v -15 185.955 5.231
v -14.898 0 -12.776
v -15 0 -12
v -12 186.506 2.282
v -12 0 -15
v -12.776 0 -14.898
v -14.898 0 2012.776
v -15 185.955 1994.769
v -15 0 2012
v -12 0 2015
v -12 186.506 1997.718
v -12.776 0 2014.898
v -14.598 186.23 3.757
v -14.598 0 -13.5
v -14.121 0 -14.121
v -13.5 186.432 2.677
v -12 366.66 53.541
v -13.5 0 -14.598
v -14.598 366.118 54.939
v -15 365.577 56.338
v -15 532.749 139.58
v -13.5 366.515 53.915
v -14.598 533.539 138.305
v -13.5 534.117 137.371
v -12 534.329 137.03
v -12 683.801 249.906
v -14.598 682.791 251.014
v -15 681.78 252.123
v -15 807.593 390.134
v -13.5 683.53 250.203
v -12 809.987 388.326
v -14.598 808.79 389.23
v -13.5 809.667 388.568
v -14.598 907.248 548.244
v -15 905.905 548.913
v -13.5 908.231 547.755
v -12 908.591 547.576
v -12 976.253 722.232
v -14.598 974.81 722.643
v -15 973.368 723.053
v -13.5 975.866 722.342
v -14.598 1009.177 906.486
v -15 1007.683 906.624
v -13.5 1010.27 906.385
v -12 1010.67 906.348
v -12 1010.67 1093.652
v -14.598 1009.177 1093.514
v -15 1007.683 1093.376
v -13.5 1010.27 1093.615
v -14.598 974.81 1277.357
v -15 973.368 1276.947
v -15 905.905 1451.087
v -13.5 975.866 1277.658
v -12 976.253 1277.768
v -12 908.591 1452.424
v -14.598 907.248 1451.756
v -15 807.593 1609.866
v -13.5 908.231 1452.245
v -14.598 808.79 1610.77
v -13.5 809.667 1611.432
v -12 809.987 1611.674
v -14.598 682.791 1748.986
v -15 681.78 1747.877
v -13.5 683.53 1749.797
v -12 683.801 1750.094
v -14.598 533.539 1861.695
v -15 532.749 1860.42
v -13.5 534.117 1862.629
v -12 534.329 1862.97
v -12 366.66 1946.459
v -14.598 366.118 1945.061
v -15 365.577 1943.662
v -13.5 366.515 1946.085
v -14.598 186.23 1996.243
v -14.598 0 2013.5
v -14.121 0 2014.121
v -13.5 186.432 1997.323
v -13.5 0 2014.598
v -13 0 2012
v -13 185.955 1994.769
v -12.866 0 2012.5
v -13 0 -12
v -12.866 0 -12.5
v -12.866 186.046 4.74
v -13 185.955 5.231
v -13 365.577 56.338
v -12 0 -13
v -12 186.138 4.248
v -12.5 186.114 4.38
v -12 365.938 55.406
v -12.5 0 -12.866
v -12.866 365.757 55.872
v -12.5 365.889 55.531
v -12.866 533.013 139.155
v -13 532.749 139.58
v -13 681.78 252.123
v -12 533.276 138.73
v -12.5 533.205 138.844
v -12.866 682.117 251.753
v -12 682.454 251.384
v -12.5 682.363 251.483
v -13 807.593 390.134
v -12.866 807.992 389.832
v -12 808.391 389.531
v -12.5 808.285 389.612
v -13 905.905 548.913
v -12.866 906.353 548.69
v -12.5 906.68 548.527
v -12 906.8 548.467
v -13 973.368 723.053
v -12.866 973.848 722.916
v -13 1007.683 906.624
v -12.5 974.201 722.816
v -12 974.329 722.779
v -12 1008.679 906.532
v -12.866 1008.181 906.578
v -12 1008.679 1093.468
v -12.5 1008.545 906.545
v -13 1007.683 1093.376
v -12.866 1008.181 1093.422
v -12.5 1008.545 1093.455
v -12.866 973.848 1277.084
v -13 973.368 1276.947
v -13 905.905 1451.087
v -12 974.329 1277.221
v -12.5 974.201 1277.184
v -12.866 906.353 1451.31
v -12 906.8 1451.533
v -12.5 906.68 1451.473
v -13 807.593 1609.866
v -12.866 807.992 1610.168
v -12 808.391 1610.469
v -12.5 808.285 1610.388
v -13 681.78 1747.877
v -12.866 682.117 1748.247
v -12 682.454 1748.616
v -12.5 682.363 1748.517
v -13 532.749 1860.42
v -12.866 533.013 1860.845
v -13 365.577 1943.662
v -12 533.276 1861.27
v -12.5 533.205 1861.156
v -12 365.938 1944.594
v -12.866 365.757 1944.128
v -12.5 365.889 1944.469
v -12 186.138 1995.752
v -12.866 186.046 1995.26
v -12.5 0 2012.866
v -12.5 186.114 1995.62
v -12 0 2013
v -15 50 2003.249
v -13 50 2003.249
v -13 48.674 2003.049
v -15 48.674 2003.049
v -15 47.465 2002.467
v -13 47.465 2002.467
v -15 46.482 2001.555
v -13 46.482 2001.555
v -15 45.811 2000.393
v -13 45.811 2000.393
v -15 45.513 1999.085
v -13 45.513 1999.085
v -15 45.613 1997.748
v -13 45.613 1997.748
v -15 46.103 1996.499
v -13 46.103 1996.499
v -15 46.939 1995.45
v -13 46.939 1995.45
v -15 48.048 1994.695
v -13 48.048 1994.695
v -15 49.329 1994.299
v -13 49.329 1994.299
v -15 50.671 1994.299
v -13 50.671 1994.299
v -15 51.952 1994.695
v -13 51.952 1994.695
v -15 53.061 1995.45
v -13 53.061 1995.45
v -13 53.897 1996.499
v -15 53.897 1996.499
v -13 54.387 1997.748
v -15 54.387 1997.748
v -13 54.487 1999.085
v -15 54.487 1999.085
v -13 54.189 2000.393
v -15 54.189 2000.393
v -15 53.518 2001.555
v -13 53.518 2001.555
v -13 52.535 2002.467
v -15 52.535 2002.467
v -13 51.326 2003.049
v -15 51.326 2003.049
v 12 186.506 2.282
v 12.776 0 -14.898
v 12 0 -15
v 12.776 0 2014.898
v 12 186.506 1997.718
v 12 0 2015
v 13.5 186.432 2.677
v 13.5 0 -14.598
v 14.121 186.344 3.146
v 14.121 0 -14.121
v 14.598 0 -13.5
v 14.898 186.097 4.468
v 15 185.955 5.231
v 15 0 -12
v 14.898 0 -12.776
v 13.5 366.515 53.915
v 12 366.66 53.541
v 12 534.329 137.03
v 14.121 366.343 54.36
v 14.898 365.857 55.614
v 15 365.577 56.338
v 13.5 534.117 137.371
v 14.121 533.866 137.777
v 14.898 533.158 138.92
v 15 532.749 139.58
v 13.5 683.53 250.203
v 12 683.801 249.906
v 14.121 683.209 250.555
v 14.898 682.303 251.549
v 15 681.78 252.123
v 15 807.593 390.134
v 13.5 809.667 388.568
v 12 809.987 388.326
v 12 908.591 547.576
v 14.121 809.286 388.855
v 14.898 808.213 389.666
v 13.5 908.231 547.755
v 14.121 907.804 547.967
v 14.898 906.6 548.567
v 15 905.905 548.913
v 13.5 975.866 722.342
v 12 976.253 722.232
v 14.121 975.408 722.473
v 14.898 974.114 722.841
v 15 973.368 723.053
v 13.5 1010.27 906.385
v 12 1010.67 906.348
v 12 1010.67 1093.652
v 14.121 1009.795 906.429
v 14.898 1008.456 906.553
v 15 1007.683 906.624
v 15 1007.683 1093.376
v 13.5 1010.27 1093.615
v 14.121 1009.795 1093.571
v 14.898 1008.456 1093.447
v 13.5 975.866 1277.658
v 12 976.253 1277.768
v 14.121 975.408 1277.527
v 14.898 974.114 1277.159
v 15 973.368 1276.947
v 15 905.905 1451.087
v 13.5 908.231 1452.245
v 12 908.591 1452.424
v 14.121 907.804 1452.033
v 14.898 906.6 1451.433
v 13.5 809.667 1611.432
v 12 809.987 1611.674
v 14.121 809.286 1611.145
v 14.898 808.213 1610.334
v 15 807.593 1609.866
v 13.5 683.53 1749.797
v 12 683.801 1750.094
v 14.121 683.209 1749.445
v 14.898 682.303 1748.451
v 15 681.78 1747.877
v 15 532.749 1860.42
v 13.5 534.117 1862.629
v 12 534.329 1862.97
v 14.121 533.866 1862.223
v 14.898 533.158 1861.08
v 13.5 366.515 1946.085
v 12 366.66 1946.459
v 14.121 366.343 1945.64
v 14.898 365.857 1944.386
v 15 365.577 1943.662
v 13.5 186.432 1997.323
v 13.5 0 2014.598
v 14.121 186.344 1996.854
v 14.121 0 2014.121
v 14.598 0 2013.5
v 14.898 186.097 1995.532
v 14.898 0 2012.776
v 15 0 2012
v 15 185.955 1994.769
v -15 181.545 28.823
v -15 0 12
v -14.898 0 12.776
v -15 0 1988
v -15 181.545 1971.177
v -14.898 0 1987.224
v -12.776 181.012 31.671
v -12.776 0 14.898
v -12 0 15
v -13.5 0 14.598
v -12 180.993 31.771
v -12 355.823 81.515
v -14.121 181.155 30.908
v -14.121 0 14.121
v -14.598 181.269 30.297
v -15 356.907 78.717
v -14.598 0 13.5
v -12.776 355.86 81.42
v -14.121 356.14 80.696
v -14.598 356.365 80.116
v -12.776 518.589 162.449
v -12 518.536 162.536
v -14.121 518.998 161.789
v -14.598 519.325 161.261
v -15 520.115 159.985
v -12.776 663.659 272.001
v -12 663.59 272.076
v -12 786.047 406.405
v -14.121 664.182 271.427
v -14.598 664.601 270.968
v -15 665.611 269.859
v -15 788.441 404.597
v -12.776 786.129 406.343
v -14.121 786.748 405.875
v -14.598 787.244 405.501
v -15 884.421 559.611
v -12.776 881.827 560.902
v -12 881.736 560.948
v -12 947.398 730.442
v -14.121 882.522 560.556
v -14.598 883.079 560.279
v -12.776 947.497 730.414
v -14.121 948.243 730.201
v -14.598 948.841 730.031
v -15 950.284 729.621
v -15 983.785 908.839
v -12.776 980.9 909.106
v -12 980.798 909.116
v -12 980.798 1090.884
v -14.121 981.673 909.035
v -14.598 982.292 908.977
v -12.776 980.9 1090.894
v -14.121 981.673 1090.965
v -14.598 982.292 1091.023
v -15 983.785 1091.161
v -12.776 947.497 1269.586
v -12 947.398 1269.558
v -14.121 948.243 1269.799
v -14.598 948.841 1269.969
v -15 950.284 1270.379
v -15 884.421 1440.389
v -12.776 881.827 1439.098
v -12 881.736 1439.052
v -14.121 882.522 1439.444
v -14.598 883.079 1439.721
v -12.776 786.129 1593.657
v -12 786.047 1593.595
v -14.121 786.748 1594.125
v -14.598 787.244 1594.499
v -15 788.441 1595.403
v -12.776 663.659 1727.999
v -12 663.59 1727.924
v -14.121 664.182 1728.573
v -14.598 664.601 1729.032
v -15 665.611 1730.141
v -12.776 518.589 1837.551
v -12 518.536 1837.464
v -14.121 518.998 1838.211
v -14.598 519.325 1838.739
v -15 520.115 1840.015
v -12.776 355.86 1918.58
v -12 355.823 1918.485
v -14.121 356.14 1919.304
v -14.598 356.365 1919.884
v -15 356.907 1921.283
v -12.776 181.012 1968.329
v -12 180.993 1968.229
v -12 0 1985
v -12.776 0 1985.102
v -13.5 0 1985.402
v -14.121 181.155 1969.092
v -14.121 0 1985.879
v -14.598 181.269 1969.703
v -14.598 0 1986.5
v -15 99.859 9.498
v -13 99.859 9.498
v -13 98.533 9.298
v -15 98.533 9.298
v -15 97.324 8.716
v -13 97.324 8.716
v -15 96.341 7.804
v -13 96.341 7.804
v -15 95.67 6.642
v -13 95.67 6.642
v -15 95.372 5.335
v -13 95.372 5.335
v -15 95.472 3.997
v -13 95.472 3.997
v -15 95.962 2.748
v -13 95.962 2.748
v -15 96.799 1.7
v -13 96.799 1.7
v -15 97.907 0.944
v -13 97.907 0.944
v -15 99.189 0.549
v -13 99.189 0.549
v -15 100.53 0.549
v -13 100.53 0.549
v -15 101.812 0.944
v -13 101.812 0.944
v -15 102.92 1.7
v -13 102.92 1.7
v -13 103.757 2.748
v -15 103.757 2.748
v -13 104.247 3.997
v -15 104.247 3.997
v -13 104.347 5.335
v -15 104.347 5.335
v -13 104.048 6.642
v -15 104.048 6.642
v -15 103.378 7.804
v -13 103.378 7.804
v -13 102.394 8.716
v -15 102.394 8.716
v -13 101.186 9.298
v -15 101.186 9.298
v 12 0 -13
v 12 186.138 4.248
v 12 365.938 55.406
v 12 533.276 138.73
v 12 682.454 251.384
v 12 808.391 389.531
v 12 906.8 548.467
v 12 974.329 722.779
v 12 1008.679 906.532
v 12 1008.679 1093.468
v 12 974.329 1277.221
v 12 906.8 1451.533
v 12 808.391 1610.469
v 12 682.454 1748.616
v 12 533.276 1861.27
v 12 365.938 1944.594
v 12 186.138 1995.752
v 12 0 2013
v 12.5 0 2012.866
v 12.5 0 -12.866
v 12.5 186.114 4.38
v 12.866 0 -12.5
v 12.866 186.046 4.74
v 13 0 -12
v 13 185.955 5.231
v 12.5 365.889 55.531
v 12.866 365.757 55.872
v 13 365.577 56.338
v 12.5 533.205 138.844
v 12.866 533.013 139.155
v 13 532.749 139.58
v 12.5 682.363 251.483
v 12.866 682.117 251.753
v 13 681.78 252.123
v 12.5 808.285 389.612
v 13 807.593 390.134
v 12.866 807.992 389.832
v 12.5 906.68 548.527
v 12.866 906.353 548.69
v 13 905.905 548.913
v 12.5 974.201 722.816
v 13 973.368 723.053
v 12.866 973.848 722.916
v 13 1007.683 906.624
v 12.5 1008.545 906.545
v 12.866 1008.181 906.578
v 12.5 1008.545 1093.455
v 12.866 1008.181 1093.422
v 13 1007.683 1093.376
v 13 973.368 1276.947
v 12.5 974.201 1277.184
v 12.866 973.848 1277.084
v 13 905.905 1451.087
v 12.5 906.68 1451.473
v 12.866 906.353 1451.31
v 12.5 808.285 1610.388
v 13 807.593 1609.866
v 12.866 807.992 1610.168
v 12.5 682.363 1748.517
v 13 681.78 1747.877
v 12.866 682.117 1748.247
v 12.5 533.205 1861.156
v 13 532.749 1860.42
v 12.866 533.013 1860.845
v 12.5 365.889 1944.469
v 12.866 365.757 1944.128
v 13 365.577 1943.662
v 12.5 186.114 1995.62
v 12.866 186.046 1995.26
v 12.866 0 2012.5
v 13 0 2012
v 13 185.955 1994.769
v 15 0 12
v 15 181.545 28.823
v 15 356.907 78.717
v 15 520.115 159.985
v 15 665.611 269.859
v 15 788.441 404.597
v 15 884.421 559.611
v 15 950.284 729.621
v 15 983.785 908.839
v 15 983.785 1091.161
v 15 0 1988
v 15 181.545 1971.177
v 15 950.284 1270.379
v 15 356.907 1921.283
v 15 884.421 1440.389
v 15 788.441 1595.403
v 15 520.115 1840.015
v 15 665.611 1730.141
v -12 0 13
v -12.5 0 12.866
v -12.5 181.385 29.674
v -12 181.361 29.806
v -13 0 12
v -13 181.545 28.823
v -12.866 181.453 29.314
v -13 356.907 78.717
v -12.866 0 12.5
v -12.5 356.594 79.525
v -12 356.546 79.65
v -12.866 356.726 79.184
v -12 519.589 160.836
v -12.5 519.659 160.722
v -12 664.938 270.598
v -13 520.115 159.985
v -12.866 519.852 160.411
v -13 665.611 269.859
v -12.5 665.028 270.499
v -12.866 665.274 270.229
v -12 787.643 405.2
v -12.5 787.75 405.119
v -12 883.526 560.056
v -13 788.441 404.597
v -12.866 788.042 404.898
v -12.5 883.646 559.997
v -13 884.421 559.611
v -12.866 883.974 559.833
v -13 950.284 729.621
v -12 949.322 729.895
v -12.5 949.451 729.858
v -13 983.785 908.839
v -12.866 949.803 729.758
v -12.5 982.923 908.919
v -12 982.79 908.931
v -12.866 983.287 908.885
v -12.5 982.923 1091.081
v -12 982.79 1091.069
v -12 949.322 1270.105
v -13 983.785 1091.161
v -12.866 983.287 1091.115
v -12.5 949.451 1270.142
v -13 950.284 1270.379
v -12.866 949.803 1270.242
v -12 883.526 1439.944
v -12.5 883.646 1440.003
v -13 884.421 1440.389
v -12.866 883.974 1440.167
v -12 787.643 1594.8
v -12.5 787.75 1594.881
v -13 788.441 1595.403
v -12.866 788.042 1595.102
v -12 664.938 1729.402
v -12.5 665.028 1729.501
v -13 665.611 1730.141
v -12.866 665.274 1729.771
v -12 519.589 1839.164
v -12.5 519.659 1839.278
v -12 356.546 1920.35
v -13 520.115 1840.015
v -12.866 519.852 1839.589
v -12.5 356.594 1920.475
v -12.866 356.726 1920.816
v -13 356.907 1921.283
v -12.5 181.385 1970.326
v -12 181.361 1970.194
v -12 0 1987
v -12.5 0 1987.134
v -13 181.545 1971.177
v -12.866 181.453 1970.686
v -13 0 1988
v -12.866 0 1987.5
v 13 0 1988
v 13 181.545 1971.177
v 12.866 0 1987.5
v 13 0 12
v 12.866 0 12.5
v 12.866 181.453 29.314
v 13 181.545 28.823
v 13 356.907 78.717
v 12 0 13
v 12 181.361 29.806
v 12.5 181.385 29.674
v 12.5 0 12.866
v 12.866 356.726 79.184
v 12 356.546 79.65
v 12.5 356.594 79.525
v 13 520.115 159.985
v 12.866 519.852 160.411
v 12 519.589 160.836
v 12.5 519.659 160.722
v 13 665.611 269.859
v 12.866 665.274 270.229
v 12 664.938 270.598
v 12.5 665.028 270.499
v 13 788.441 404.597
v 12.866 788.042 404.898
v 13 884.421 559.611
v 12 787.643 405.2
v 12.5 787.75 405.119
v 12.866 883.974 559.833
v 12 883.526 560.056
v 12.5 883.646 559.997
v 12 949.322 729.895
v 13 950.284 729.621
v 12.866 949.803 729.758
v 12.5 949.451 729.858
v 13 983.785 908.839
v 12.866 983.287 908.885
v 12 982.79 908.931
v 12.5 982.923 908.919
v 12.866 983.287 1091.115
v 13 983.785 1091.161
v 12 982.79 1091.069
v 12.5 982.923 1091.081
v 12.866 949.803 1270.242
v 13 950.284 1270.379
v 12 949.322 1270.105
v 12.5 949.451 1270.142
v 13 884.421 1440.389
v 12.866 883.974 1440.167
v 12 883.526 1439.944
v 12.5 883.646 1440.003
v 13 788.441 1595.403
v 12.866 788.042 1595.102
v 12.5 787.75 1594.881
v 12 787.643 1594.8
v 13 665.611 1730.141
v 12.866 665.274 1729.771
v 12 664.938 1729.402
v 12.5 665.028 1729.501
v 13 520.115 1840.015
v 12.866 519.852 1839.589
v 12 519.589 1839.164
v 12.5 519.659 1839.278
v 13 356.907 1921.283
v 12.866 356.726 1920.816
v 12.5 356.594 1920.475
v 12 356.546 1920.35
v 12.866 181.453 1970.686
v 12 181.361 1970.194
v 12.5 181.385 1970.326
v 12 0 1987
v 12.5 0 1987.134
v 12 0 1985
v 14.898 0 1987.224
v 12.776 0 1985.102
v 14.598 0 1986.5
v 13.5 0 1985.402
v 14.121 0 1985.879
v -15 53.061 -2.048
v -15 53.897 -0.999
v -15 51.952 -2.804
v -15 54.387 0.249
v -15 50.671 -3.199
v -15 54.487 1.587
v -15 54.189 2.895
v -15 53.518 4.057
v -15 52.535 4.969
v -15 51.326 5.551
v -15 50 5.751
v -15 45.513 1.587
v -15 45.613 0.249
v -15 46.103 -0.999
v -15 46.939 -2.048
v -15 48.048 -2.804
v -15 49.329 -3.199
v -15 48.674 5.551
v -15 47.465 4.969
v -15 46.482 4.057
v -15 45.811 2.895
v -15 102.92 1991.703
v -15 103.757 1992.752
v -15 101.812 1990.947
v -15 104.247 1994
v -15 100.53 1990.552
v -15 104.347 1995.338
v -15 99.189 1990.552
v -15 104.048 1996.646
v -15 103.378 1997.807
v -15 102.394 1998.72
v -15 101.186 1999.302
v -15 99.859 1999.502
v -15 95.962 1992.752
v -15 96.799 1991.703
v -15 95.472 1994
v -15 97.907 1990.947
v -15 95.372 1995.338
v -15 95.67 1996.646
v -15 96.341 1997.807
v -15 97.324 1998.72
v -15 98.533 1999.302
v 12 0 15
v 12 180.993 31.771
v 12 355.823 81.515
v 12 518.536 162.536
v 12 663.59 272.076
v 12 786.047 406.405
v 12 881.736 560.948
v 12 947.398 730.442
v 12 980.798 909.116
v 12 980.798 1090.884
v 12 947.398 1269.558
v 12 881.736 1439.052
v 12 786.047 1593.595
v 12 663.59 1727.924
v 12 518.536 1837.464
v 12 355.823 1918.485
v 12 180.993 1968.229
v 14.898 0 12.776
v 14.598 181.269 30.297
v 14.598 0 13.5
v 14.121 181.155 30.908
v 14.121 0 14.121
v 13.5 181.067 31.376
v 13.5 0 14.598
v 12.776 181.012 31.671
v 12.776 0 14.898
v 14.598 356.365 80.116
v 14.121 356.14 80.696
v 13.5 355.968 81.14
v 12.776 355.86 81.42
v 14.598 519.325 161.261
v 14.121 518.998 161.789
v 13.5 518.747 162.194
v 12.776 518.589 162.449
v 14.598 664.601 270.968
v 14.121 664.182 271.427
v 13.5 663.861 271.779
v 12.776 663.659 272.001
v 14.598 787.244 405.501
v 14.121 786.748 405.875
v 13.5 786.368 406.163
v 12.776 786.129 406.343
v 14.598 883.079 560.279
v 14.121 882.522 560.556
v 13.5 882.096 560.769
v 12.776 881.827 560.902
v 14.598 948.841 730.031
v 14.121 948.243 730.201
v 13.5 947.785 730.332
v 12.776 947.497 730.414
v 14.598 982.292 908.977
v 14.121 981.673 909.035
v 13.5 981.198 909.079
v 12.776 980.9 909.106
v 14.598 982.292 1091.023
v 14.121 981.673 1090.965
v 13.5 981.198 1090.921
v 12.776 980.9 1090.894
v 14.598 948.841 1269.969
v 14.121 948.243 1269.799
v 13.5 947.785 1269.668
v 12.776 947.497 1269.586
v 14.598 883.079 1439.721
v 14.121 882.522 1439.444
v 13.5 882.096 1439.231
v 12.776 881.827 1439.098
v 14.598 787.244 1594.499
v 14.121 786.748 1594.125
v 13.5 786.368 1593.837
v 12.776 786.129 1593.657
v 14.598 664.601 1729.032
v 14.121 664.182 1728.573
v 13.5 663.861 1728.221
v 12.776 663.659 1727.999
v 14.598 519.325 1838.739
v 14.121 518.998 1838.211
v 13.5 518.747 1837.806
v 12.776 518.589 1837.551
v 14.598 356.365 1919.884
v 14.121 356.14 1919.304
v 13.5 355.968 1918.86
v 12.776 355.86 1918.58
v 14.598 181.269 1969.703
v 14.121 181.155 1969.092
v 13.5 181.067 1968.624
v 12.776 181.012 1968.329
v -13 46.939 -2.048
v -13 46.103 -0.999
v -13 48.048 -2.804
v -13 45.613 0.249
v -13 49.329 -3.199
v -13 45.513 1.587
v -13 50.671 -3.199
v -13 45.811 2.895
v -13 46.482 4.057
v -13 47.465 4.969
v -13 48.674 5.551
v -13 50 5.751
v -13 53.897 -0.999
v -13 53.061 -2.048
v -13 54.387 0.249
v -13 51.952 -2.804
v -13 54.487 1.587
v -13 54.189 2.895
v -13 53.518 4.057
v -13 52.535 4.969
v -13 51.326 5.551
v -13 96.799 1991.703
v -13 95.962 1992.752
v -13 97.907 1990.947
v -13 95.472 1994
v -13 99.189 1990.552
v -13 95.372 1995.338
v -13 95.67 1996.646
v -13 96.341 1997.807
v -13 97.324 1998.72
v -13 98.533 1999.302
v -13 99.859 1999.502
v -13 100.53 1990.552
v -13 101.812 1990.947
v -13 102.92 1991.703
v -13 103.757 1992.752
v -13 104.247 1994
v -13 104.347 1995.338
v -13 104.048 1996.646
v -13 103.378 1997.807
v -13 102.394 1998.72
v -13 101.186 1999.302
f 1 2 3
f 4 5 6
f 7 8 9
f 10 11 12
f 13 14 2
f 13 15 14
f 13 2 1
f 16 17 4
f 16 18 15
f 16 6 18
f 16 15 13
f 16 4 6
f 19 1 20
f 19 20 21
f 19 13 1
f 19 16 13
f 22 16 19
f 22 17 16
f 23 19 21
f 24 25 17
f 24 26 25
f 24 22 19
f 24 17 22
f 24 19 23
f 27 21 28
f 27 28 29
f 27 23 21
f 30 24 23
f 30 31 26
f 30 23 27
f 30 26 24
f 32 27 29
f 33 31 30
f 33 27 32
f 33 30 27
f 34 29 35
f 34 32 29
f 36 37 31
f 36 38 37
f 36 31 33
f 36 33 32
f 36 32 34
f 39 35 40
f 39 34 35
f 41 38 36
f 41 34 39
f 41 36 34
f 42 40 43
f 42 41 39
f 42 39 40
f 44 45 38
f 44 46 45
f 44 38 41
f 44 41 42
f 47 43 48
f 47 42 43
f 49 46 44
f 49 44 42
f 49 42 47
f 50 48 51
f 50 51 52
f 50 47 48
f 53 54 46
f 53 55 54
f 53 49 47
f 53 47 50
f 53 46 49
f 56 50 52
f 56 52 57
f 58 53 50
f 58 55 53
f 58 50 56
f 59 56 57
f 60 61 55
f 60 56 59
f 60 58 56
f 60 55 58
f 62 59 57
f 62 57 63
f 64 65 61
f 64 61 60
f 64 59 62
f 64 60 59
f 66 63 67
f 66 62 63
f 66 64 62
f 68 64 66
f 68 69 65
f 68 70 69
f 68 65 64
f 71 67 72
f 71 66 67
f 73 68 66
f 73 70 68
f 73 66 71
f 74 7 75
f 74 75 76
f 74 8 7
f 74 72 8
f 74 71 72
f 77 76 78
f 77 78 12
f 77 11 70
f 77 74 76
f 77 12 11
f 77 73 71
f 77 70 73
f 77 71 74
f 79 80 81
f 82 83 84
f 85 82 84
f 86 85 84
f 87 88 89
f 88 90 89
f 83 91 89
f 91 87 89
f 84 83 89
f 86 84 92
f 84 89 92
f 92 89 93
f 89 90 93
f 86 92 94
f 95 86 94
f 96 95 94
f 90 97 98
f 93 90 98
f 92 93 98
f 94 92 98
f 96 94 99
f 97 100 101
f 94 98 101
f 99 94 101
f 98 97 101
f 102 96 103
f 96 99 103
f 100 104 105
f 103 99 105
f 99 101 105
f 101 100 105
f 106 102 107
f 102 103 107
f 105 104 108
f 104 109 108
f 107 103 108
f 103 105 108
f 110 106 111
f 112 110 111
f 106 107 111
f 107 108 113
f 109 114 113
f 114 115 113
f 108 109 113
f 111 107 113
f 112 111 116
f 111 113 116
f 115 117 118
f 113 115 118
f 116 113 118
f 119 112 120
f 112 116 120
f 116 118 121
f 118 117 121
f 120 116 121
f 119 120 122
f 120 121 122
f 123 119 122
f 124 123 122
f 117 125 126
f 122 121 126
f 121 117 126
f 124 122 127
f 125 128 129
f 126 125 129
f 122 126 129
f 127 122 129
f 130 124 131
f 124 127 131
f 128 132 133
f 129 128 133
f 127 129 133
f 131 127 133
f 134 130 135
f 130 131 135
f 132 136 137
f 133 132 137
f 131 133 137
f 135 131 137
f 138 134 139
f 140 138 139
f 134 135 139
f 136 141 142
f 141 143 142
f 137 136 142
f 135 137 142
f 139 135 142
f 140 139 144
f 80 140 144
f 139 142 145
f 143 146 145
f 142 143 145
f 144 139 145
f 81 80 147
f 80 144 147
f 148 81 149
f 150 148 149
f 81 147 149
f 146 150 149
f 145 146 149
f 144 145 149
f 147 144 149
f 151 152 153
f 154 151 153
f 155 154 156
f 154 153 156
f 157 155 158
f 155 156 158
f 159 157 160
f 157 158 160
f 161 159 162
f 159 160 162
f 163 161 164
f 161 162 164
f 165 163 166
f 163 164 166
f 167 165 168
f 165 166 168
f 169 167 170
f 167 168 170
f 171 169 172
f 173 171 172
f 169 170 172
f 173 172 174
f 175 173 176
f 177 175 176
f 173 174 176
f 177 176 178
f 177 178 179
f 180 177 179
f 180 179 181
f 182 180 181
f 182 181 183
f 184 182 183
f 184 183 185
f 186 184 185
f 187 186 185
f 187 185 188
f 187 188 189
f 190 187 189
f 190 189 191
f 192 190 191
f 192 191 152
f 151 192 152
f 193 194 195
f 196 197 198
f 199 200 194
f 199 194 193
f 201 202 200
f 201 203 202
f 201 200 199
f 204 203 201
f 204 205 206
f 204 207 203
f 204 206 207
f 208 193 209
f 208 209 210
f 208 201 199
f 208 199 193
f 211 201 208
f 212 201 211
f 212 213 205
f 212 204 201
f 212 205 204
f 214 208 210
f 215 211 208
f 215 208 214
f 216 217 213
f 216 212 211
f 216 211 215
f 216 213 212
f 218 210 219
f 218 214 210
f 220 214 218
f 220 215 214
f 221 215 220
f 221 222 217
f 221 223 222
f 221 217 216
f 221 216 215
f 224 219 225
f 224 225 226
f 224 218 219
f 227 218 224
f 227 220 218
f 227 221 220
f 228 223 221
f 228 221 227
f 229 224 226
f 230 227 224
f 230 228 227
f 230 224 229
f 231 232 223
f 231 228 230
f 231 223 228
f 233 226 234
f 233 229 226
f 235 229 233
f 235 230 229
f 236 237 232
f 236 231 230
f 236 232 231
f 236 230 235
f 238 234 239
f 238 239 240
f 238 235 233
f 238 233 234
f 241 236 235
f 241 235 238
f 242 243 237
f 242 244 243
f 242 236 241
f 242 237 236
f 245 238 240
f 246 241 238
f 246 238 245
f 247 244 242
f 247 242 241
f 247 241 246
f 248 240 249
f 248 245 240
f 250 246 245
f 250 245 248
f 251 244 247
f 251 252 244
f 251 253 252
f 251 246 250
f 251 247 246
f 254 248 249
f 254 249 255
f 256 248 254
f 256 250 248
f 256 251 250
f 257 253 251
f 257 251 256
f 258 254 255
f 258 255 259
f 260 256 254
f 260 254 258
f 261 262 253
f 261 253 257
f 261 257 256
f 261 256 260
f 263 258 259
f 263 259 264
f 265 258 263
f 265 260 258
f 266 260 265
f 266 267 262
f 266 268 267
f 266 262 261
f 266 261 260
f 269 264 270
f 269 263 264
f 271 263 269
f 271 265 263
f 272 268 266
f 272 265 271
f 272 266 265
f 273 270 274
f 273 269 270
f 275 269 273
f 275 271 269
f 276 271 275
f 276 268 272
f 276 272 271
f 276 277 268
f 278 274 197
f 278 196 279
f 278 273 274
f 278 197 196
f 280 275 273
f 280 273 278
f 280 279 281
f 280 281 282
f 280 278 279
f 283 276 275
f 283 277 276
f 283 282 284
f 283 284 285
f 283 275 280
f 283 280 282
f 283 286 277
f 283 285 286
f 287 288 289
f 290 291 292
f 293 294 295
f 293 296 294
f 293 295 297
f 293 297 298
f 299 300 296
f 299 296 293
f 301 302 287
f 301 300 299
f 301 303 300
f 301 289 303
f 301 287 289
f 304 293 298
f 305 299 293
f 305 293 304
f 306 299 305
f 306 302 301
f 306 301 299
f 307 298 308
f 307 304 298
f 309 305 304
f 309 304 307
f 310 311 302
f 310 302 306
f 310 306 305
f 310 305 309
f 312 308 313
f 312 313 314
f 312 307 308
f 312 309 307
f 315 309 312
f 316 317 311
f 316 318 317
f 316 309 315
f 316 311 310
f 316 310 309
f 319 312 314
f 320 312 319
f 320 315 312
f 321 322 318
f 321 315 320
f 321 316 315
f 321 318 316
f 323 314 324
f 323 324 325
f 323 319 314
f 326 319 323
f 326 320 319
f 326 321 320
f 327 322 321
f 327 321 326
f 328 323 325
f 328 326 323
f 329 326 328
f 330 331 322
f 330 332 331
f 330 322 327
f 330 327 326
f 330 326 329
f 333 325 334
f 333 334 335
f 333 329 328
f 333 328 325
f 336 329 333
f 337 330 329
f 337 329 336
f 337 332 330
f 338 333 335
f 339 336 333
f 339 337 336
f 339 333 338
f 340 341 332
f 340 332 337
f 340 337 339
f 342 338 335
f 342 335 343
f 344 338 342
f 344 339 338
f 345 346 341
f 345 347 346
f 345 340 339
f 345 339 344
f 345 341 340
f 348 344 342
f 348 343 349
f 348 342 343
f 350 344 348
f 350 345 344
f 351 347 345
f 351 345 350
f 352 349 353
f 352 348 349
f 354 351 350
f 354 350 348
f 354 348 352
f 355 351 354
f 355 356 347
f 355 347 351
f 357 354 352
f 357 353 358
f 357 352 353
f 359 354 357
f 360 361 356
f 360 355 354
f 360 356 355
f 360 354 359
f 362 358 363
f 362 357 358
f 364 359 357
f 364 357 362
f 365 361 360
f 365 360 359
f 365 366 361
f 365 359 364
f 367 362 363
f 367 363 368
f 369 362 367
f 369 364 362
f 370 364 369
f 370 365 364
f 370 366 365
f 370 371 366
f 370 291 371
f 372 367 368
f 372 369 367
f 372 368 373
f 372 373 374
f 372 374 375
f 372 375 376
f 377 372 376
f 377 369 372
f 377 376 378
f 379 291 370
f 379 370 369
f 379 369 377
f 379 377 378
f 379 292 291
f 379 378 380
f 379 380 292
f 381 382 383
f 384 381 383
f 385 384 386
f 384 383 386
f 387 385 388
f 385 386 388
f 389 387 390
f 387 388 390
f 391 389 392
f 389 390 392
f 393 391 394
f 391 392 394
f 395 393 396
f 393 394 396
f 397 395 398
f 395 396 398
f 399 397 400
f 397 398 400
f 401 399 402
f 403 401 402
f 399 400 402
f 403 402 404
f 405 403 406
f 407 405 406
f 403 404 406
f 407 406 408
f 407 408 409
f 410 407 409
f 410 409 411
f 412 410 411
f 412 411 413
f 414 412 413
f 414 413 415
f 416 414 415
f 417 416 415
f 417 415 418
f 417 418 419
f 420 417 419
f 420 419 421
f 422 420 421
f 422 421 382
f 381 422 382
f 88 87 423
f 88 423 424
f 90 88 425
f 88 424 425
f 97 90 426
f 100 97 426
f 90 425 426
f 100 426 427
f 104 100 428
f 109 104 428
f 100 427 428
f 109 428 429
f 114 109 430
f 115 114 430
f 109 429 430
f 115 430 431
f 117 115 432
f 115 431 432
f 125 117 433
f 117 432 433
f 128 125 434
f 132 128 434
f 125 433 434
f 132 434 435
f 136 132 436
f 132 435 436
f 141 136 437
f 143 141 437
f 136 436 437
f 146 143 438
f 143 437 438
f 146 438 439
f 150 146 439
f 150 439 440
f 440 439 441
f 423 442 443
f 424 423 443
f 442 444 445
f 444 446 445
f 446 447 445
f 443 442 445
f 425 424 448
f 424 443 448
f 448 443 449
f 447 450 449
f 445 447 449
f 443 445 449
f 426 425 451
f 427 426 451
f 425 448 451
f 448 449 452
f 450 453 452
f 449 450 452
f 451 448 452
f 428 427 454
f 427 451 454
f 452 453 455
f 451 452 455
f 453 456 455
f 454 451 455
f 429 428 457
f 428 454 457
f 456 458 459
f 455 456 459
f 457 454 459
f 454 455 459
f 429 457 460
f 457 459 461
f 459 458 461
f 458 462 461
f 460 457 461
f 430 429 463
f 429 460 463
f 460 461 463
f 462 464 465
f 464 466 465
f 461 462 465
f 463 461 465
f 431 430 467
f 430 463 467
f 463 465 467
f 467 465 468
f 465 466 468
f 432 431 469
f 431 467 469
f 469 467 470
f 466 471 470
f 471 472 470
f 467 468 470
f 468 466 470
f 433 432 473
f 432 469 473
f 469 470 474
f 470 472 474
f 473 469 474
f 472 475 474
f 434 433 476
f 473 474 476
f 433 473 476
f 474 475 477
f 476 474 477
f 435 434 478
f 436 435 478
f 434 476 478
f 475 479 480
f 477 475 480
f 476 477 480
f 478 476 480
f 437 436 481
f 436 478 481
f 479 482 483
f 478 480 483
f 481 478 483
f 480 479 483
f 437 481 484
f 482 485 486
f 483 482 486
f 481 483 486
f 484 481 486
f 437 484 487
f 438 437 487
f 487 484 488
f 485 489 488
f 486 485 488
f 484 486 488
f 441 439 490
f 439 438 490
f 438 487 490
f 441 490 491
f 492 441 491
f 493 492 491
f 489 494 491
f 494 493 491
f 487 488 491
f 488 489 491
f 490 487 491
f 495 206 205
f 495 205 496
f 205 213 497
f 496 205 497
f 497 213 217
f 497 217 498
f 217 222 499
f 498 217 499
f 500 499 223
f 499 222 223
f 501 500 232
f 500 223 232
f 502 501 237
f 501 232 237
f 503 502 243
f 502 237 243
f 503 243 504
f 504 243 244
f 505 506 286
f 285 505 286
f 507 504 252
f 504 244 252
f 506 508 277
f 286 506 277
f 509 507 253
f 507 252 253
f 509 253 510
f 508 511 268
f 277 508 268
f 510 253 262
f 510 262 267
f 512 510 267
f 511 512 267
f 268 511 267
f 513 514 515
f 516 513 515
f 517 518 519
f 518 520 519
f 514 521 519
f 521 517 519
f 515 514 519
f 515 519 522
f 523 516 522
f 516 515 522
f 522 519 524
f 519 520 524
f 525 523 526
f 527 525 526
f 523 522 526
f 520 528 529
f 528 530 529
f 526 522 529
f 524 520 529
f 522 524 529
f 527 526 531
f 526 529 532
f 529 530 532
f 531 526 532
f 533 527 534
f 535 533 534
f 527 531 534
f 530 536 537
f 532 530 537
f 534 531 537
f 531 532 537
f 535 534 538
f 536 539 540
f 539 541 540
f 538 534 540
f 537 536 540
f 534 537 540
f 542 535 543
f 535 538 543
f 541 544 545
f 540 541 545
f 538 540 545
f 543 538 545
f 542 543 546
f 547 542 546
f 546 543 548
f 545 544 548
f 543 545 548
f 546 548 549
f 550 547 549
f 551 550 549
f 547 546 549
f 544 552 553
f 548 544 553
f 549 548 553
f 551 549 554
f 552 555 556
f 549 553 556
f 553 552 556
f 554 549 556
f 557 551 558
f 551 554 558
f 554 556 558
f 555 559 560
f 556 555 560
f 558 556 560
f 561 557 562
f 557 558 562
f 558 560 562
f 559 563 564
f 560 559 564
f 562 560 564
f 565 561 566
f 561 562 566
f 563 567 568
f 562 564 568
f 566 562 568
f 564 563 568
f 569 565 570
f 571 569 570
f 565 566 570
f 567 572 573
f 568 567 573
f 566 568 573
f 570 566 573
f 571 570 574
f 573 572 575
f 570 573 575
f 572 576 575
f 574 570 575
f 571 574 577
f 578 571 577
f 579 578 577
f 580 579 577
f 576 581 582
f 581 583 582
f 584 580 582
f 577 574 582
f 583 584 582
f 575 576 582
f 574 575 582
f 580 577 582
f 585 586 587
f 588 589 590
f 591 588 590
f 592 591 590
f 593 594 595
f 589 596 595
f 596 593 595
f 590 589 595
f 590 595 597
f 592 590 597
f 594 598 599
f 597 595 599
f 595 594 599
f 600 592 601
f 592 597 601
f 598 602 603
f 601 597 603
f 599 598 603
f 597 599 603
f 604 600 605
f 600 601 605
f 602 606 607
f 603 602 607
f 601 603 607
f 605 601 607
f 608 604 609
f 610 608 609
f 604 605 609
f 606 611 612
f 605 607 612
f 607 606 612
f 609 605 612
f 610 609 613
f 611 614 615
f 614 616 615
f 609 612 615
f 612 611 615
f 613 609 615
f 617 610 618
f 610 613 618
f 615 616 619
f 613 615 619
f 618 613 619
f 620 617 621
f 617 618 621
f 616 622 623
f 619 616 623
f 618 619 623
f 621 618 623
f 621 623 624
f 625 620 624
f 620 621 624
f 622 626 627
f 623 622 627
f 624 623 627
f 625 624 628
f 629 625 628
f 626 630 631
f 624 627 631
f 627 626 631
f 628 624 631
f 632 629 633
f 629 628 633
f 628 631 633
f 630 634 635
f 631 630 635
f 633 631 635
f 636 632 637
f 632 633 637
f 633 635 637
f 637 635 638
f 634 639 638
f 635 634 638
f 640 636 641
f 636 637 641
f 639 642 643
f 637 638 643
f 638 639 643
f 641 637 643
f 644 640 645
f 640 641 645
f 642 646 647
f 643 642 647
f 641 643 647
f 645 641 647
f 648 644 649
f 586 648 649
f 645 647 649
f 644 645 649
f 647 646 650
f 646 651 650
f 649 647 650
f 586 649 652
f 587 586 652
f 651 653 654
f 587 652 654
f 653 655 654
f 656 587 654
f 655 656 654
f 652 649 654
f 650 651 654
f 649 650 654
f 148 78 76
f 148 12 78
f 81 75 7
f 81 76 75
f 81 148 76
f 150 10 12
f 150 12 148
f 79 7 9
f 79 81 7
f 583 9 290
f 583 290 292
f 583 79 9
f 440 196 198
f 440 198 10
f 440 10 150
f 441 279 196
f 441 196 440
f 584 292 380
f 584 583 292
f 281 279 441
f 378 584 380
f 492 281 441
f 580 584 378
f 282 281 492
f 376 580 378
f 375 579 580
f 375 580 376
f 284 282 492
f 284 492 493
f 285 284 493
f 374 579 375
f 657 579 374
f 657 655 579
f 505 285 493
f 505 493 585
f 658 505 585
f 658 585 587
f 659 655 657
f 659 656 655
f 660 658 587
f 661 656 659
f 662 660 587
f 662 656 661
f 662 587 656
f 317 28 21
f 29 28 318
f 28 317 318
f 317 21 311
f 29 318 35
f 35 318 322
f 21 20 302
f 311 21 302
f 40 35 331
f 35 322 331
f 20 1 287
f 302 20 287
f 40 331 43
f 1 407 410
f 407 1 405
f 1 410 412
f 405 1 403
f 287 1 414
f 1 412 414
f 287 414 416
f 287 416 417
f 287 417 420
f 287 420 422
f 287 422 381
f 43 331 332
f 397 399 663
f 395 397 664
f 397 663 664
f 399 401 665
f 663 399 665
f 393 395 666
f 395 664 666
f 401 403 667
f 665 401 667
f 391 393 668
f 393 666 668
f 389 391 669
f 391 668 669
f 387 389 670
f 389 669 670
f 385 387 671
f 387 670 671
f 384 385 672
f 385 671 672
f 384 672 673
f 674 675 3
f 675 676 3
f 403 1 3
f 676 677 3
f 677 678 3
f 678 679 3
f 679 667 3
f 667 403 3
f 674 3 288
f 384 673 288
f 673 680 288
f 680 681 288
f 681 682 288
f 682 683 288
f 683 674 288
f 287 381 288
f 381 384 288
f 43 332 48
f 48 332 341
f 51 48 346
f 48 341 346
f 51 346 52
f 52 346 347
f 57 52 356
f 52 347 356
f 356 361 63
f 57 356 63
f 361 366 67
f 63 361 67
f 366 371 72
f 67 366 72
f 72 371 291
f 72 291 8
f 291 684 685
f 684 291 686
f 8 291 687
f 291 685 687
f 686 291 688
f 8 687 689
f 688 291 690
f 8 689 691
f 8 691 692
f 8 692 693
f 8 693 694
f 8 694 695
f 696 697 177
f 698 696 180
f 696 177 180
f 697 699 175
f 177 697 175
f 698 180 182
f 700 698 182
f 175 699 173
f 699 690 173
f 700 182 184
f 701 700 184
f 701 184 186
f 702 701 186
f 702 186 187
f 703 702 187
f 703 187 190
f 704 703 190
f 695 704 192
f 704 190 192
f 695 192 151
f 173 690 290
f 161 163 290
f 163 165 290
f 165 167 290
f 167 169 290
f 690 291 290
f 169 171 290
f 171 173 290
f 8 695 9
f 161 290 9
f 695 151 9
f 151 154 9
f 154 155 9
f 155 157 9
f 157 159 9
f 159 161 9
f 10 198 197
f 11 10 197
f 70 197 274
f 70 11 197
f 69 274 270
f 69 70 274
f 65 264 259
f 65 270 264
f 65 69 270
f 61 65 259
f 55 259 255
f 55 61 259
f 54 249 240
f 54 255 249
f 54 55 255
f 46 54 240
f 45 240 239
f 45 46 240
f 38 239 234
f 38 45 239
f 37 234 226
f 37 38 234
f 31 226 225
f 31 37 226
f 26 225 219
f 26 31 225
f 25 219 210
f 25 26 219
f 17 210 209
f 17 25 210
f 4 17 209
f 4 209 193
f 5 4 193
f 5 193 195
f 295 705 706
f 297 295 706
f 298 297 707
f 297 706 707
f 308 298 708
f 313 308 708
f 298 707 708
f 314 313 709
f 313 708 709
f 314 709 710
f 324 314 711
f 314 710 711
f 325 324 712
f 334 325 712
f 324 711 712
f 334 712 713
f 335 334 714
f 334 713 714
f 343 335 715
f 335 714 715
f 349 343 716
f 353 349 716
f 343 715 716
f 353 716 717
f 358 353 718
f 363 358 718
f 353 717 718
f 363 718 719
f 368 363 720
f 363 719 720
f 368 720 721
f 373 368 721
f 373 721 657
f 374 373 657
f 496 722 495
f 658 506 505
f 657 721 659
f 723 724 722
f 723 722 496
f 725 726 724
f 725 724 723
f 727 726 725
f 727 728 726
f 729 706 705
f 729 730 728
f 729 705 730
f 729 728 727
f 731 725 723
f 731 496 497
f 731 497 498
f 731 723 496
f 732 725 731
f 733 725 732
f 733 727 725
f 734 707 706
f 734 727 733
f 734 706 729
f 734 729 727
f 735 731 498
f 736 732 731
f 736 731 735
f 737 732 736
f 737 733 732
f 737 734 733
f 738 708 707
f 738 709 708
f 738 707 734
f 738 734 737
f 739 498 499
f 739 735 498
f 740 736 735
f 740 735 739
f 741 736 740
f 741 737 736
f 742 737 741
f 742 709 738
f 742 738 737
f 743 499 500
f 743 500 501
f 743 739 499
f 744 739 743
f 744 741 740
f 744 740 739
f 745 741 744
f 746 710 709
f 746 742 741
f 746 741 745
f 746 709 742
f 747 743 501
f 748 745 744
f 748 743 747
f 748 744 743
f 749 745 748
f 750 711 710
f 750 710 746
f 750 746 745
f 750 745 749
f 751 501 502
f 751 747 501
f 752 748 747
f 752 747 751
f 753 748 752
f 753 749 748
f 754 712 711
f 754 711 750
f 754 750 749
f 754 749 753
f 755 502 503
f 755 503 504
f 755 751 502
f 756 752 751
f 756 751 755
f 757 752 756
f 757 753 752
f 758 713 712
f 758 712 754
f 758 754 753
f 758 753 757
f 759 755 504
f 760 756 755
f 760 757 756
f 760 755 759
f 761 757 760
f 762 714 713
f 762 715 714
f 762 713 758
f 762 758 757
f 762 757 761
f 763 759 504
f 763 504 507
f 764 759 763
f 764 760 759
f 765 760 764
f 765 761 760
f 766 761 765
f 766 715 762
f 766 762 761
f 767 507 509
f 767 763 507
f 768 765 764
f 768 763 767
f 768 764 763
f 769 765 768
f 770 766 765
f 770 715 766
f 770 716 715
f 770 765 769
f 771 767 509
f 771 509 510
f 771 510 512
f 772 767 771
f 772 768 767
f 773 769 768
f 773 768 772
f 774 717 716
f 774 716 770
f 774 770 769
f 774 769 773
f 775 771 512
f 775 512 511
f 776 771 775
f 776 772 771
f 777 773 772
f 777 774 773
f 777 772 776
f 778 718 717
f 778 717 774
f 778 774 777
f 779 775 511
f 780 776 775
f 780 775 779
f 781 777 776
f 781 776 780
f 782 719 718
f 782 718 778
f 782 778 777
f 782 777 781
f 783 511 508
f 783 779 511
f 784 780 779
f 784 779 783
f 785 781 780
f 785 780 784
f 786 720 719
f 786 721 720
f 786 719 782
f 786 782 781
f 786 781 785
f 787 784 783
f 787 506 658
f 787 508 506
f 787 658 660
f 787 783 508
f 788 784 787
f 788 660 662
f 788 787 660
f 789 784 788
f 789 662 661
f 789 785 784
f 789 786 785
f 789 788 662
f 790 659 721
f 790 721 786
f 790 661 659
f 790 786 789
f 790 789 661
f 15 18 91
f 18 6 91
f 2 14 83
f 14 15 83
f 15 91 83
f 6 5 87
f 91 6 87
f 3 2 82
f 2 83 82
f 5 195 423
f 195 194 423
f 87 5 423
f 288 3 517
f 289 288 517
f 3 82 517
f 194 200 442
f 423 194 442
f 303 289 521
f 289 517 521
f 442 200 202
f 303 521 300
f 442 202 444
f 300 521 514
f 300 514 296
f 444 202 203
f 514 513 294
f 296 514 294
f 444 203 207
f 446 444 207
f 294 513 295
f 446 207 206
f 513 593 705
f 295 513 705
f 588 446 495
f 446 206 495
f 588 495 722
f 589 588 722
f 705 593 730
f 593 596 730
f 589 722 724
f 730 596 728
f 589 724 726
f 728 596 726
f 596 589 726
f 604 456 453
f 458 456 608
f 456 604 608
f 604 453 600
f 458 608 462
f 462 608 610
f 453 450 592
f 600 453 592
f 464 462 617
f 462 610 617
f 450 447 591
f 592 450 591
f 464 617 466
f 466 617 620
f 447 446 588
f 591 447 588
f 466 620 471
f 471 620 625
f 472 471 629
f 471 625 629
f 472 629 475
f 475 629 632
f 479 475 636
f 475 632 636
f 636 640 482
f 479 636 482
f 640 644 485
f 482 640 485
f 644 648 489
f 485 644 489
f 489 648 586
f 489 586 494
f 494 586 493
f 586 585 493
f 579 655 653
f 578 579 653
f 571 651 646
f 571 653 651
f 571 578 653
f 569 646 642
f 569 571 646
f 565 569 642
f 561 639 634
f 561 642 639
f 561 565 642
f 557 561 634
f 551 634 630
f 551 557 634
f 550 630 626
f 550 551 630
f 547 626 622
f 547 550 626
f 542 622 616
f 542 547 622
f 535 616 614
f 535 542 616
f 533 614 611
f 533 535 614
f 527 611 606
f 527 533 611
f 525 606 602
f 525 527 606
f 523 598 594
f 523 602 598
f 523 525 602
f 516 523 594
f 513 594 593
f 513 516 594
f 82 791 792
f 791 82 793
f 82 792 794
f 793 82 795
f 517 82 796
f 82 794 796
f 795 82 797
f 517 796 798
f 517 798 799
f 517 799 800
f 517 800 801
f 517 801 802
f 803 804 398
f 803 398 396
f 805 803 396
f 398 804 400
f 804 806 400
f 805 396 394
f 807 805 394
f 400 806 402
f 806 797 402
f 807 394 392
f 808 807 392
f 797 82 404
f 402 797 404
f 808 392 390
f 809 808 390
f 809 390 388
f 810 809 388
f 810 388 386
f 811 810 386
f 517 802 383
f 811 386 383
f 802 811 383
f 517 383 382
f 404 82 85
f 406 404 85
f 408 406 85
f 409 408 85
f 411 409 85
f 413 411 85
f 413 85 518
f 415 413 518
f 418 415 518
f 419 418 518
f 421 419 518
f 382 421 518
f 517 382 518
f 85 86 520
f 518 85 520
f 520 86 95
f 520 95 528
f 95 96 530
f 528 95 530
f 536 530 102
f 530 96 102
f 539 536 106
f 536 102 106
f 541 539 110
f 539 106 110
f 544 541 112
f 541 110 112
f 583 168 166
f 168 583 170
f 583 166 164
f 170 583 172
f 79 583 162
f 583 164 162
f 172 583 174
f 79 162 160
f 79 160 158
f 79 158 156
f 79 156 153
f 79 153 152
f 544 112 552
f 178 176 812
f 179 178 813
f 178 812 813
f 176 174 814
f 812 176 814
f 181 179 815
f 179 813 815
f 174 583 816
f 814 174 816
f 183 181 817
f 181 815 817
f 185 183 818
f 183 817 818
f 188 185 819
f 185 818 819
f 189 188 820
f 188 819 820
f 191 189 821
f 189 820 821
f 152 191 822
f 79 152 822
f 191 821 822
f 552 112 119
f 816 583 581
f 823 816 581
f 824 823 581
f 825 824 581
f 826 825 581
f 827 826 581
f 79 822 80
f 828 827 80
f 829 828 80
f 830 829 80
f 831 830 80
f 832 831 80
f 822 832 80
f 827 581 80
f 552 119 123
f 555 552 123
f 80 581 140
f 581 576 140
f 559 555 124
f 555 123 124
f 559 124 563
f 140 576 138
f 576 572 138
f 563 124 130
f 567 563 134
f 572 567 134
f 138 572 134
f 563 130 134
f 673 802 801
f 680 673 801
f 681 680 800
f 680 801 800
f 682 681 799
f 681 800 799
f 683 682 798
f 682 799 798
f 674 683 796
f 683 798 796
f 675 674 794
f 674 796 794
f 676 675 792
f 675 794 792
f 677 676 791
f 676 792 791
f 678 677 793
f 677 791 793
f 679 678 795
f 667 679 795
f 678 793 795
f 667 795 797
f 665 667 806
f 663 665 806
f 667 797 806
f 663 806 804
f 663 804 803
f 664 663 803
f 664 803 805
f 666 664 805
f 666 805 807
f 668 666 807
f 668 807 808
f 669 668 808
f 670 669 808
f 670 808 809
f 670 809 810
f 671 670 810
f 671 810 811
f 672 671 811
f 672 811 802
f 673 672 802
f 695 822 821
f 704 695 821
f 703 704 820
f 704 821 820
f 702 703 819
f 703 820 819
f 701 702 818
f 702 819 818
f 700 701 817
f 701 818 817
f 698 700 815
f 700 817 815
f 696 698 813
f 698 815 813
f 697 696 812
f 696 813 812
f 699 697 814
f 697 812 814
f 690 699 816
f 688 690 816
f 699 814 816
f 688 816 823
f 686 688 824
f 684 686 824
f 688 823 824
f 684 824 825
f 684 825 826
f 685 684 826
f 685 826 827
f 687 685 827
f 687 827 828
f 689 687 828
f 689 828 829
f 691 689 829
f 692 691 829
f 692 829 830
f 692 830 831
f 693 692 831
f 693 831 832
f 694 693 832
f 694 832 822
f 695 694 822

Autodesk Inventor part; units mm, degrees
ref_plane "YZ Plane" through (0, 0, 0) normal (1, 0, 0) x (0, 1, 0)
ref_plane "XZ Plane" through (0, 0, 0) normal (0, 1, 0) x (-1, 0, 0)
sketch "Sketch1" plane through (0, 0, 0) normal (0, 1, 0) x (-1, 0, 0)
  line L0 (-12, 14) -> (12, 14) construction
  line L1 (14, 12) -> (14, -12) construction
  line L2 (12, -14) -> (-12, -14) construction
  line L3 (-14, -12) -> (-14, 12) construction
  line L4 (-14, 14) -> (14, -14) construction
  line L5 (14, 14) -> (-14, -14) construction
  arc A0 (14, 12) -> (12, 14) centre (12, 12) ccw construction
  arc A1 (12, -14) -> (14, -12) centre (12, -12) ccw construction
  arc A2 (-14, -12) -> (-12, -14) centre (-12, -12) ccw construction
  arc A3 (-12, 14) -> (-14, 12) centre (-12, 12) ccw construction
  line L6 (-12, -15) -> (12, -15)
  arc A4 (12, -15) -> (15, -12) centre (12, -12) ccw
  line L7 (15, -12) -> (15, 12)
  arc A5 (15, 12) -> (12, 15) centre (12, 12) ccw
  line L8 (12, 15) -> (-12, 15)
  arc A6 (-12, 15) -> (-15, 12) centre (-12, 12) ccw
  line L9 (-15, 12) -> (-15, -12)
  arc A7 (-15, -12) -> (-12, -15) centre (-12, -12) ccw
  line L10 (13, -12) -> (13, 12)
  arc A8 (13, 12) -> (12, 13) centre (12, 12) ccw
  line L11 (12, 13) -> (-12, 13)
  arc A9 (-12, 13) -> (-13, 12) centre (-12, 12) ccw
  line L12 (-13, 12) -> (-13, -12)
  arc A10 (-13, -12) -> (-12, -13) centre (-12, -12) ccw
  line L13 (-12, -13) -> (12, -13)
  arc A11 (12, -13) -> (13, -12) centre (12, -12) ccw
  point P0 (0, 0)
  point P1 (0, 0)
  point P2 (0, 0)
  dimension "d10" = 2
  dimension "depth" = 30
  dimension "width" = 30
  dimension "thickness" = 2
sketch "Sketch3" plane through (0, 0, 0) normal (1, 0, 0) x (0, 1, 0)
  line L0 (0, 0) -> (0, 2000) construction
  arc A0 (0, 0) -> (0, 2000) centre (0, 1000) ccw
  line L1 (0, -400) -> (0, 2400) projected
  line L2 (-200, 0) -> (1200, 0) projected
  dimension "d30" = 2000
  dimension "d31" = 1000
sweep "Sweep1" add profiles "Sketch1" path "Sketch3" path curves A0
sketch "Sketch5" plane through (-15, 0, 1000) normal (-1, 0, 0) x (0, 0, 1)
  arc A0 (1000, 0) -> (-1000, 0) centre (0, 0) ccw construction
  line L0 (-1012, 0) -> (-988, 0) projected
  line L1 (1012, 0) -> (988, 0) projected
  point P0 (-1000, 0)
  point P1 (-998.7492, 50)
  point P2 (-995.0016, 99.8594)
  point P3 (1000, 0)
  point P4 (998.7492, 50)
  point P5 (995.0016, 99.8594)
  dimension "d46" = 50
  dimension "d51" = 50
  dimension "d52" = 50
  dimension "d53" = 50
hole "Hole3" at (-15, 50, 1.2508) at (-15, 99.8594, 4.9984) at (-15, 50, 1998.7492) at (-15, 99.8594, 1995.0016) direction (1, 0, 0) diameter 9 depth 20.2 tip angle 118
ref_plane "Work Plane3" through (0, 0, 1000) normal (0, 0, 1) x (1, 0, 0)
equation "\"d10\" = thickness"
equation "\"d31\" = 0.5 * d30"
properties part number "Luk R2000 podest" material "Steel"
